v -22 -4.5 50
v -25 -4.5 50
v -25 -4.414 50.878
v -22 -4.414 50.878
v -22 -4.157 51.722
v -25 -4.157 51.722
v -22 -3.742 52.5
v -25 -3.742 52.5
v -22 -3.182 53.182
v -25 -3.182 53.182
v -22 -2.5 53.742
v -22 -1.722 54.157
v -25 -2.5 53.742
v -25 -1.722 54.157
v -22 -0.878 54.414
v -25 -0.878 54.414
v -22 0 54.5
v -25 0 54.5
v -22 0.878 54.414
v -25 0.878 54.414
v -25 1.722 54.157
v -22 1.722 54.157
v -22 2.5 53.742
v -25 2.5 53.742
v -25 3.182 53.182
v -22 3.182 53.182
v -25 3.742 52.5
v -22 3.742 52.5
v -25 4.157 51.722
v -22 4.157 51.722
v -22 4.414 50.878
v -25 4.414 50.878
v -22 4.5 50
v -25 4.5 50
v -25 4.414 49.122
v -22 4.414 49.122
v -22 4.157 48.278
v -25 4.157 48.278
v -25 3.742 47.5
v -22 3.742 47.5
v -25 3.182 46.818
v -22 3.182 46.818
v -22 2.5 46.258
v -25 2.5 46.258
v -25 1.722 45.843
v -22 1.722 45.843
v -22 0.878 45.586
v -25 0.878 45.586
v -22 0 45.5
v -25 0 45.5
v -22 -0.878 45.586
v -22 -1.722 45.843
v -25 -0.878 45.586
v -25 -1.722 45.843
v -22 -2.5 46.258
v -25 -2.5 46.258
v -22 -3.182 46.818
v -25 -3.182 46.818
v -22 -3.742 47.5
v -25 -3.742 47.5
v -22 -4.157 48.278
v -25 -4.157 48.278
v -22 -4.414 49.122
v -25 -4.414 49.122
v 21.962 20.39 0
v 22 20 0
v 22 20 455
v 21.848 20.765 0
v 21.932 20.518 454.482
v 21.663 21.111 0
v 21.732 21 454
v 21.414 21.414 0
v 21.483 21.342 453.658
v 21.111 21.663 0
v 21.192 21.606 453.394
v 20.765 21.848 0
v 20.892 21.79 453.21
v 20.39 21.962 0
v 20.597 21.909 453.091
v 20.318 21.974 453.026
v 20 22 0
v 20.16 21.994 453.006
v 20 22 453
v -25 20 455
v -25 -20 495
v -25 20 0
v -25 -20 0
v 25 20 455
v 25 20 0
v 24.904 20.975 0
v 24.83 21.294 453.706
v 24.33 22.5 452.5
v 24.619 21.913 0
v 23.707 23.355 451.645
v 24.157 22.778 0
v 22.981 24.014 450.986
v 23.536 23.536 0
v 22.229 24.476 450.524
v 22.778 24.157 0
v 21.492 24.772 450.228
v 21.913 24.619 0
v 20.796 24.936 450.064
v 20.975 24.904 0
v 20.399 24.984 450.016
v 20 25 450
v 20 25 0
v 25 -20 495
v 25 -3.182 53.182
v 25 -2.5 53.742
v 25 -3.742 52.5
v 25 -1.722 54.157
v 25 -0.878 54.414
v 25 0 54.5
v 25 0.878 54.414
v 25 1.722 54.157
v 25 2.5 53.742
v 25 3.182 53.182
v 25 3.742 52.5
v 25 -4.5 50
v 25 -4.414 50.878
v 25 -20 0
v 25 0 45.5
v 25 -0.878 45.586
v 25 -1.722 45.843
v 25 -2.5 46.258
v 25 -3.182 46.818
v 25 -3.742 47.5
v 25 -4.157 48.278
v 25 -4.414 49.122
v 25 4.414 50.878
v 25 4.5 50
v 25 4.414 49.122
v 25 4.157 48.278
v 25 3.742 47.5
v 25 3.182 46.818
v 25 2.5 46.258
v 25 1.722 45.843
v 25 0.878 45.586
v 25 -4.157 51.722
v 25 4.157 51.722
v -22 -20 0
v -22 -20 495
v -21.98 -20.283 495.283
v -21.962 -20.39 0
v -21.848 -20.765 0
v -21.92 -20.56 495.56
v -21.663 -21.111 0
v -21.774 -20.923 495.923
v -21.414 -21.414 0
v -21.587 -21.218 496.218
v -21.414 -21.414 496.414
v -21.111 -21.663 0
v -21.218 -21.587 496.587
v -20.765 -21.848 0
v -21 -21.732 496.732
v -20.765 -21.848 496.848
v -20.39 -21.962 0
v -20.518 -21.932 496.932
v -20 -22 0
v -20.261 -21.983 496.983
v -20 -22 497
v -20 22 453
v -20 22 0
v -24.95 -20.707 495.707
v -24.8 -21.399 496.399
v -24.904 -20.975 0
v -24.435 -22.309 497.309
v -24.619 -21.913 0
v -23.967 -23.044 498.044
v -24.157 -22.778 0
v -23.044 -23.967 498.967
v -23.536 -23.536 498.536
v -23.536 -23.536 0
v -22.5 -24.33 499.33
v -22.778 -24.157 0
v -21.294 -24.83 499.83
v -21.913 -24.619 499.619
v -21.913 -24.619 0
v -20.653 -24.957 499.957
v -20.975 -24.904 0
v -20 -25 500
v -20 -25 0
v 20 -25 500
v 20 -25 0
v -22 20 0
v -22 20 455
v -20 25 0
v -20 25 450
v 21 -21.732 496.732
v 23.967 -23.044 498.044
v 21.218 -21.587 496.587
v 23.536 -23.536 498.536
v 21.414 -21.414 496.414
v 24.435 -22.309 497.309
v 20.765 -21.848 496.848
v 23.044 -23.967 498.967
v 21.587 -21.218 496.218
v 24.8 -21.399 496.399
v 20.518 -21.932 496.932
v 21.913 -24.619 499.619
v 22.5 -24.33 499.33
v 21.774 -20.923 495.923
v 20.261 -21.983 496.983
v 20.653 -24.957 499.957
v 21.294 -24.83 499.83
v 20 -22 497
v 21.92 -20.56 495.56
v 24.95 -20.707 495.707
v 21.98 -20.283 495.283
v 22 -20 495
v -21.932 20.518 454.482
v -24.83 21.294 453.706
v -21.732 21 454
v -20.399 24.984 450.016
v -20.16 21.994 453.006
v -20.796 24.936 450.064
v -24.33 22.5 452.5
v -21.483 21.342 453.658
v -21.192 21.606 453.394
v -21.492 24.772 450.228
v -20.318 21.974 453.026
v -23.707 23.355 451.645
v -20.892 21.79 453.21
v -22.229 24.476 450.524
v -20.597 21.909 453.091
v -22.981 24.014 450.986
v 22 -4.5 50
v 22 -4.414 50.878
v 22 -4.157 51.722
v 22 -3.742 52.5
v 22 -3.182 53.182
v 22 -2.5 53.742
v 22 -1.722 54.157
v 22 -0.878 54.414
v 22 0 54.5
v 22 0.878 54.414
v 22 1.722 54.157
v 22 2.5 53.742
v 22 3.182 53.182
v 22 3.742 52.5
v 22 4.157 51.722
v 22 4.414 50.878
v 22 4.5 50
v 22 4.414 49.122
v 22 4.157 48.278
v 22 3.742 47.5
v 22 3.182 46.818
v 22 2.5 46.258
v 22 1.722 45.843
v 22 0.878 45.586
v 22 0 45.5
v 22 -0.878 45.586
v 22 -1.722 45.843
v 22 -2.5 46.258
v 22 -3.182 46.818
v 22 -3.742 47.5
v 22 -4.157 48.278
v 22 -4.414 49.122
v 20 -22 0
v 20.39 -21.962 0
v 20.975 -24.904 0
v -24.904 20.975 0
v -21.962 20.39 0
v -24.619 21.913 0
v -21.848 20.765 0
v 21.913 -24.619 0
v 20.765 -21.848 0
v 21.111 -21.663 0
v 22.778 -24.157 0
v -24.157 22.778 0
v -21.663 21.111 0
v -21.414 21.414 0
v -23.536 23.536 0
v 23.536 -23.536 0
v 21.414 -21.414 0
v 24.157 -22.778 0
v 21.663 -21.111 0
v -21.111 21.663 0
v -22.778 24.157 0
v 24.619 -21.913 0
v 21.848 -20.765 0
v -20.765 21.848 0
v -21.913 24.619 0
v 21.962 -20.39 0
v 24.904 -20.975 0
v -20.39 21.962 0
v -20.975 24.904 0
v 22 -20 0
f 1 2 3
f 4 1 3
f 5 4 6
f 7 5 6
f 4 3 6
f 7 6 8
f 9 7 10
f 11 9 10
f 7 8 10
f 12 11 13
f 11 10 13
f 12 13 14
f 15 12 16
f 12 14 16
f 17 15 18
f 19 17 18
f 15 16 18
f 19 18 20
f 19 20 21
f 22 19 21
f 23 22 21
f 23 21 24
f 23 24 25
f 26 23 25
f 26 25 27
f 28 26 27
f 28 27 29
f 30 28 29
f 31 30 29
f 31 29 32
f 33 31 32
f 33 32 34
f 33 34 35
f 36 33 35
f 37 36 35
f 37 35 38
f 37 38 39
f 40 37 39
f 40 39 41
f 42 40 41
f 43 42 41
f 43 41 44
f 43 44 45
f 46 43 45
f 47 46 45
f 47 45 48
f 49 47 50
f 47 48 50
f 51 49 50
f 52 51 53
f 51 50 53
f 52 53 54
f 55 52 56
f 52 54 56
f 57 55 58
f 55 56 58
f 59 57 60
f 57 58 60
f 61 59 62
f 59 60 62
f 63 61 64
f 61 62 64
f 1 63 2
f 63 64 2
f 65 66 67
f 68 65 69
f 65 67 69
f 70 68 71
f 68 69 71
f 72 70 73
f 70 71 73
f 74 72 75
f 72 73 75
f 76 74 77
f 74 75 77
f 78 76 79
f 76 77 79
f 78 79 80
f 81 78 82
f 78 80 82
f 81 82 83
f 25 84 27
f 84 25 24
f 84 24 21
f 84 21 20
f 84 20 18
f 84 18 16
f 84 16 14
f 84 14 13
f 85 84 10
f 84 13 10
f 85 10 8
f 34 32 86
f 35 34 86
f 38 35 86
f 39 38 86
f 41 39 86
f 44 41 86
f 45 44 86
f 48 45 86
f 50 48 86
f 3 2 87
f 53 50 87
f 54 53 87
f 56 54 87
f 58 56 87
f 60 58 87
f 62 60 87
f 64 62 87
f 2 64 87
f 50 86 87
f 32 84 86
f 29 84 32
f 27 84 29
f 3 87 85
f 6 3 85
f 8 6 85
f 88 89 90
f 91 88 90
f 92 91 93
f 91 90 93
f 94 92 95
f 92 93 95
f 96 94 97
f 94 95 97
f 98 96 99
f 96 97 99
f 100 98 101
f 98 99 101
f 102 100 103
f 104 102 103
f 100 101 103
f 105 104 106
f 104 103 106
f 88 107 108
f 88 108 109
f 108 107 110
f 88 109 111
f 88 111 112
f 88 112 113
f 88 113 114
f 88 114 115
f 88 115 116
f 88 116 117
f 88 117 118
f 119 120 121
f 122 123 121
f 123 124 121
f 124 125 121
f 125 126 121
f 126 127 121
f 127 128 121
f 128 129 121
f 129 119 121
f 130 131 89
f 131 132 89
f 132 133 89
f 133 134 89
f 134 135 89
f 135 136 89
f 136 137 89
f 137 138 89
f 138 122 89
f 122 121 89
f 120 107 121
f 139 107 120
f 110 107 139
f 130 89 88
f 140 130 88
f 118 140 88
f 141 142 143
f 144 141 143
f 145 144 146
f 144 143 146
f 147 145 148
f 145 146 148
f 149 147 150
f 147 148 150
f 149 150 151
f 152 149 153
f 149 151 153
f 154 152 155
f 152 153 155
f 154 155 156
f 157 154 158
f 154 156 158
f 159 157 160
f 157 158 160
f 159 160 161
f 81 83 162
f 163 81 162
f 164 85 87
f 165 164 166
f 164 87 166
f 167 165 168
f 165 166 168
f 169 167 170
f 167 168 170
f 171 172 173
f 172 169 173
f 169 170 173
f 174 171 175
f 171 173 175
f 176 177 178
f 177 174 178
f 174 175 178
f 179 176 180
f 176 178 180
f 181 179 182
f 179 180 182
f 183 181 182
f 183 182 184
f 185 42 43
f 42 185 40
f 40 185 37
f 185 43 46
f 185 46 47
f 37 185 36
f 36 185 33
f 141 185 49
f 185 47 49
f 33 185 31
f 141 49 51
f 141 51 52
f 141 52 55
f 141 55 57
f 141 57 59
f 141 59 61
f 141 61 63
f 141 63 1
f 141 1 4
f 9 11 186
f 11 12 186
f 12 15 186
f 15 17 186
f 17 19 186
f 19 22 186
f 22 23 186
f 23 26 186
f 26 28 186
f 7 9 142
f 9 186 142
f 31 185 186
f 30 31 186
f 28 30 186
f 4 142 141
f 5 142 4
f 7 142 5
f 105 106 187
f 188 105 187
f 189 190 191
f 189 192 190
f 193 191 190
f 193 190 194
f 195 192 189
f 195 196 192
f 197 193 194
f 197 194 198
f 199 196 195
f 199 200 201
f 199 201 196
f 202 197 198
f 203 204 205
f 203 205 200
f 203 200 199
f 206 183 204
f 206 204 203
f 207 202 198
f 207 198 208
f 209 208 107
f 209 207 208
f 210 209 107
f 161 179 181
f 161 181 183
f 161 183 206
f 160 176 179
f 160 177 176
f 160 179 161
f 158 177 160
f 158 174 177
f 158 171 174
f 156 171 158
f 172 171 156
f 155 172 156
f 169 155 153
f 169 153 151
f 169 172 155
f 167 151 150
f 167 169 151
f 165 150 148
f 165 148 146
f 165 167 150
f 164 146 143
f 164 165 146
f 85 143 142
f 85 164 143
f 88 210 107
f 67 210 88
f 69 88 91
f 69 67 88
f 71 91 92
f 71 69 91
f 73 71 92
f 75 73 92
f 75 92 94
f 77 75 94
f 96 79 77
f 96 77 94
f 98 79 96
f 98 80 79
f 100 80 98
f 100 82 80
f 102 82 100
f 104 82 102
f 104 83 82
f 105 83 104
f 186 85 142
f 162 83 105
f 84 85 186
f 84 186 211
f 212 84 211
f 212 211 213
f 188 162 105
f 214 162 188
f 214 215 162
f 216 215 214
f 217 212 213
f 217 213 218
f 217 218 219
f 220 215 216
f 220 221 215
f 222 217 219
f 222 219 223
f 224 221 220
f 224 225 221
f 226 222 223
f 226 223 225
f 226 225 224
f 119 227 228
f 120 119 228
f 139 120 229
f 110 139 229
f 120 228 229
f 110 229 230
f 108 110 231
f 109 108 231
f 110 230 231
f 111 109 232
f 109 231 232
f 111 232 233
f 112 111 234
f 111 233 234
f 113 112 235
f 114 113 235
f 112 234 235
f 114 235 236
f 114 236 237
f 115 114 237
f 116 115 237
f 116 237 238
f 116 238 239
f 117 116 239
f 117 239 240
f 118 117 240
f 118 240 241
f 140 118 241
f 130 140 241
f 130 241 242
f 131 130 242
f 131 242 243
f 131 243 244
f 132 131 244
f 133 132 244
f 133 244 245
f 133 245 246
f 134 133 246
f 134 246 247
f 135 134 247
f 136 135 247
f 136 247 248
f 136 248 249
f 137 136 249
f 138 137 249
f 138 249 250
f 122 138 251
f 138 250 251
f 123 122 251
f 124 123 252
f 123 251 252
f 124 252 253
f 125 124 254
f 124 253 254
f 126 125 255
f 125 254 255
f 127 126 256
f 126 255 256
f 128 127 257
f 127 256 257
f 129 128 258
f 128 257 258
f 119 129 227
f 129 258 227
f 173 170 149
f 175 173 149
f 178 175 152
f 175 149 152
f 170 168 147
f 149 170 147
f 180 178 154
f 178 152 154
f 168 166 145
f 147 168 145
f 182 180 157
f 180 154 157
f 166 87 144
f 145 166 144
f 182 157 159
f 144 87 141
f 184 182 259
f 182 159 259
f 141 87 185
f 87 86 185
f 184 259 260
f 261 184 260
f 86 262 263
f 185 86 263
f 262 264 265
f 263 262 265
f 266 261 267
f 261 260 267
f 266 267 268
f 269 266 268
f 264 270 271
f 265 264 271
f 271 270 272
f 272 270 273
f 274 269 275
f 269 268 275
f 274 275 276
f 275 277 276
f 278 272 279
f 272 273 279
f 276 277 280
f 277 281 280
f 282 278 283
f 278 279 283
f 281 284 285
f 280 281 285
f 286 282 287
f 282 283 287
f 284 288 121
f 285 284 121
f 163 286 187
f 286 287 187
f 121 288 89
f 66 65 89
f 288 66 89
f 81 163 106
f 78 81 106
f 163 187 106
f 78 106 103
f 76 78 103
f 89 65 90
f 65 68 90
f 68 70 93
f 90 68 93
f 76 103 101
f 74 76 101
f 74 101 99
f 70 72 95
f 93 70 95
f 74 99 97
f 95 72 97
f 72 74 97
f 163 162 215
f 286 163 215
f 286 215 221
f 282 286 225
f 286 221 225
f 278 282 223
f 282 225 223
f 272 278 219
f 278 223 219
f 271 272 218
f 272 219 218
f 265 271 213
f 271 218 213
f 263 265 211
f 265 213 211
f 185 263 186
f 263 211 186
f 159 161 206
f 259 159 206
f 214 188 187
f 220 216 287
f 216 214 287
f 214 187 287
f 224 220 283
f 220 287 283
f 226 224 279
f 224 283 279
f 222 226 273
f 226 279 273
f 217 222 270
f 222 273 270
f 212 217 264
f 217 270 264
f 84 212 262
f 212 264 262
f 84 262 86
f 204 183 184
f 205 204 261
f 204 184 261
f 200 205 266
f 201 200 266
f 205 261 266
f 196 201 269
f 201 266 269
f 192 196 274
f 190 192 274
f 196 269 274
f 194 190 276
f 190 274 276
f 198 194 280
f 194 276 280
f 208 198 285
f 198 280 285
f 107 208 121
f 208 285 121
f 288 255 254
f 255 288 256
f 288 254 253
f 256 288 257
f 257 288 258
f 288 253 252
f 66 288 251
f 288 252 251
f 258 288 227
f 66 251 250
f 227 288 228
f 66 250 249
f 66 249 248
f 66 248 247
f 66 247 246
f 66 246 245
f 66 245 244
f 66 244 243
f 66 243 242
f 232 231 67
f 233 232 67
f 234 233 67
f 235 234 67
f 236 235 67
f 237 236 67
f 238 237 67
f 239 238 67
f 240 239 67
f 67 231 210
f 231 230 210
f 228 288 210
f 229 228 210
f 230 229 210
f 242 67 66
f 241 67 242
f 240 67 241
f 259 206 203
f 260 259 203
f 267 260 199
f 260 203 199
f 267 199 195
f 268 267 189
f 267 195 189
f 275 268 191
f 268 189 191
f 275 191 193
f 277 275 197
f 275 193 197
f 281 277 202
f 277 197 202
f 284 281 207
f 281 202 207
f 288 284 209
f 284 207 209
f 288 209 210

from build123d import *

# Parameters (mm, degrees)
F1_DEPTH      = 500
F3_DEPTH      = 500.001
F5_DEPTH      = 25.001
F5_DEPTH_BACK = 25
F7_D          = 9


with BuildPart() as f1:
    # F0 (on Top) → F1 (new body)
    with BuildSketch(Plane.XY):
        with BuildLine():
            ThreePointArc((25, 20), (23.5355339059, 23.5355339059), (20, 25))
            Line((20, 25), (-20, 25))
            ThreePointArc((-20, 25), (-23.5355339059, 23.5355339059), (-25, 20))
            Line((-25, 20), (-25, -20))
            ThreePointArc((-25, -20), (-23.5355339059, -23.5355339059), (-20, -25))
            Line((-20, -25), (20, -25))
            ThreePointArc((20, -25), (23.5355339059, -23.5355339059), (25, -20))
            Line((25, -20), (25, 20))
        make_face()
    extrude(amount=F1_DEPTH)

    # F2 (on face) → F3 (cut, through all)
    with BuildSketch(Plane.XY.offset(500)):
        with BuildLine():
            ThreePointArc((-22, -20), (-21.4142135624, -21.4142135624), (-20, -22))
            Line((-20, -22), (20, -22))
            ThreePointArc((20, -22), (21.4142135624, -21.4142135624), (22, -20))
            Line((22, -20), (22, 20))
            ThreePointArc((22, 20), (21.4142135624, 21.4142135624), (20, 22))
            Line((20, 22), (-20, 22))
            ThreePointArc((-20, 22), (-21.4142135624, 21.4142135624), (-22, 20))
            Line((-22, 20), (-22, -20))
        make_face()
    extrude(amount=-F3_DEPTH, mode=Mode.SUBTRACT)

    # F4 (on Right) → F5 (cut, two sides)
    with BuildSketch(Plane.YZ) as f5_sk:
        Polygon((25, 500), (-25, 500), (25, 450), align=None)
    extrude(amount=-F5_DEPTH, mode=Mode.SUBTRACT)
    extrude(f5_sk.sketch, amount=F5_DEPTH_BACK, mode=Mode.SUBTRACT)

    # F7 (through all)
    with Locations(Plane.YZ.offset(25)):
        with Locations((0, 50)):
            Hole(F7_D / 2)


solid = f1.part
